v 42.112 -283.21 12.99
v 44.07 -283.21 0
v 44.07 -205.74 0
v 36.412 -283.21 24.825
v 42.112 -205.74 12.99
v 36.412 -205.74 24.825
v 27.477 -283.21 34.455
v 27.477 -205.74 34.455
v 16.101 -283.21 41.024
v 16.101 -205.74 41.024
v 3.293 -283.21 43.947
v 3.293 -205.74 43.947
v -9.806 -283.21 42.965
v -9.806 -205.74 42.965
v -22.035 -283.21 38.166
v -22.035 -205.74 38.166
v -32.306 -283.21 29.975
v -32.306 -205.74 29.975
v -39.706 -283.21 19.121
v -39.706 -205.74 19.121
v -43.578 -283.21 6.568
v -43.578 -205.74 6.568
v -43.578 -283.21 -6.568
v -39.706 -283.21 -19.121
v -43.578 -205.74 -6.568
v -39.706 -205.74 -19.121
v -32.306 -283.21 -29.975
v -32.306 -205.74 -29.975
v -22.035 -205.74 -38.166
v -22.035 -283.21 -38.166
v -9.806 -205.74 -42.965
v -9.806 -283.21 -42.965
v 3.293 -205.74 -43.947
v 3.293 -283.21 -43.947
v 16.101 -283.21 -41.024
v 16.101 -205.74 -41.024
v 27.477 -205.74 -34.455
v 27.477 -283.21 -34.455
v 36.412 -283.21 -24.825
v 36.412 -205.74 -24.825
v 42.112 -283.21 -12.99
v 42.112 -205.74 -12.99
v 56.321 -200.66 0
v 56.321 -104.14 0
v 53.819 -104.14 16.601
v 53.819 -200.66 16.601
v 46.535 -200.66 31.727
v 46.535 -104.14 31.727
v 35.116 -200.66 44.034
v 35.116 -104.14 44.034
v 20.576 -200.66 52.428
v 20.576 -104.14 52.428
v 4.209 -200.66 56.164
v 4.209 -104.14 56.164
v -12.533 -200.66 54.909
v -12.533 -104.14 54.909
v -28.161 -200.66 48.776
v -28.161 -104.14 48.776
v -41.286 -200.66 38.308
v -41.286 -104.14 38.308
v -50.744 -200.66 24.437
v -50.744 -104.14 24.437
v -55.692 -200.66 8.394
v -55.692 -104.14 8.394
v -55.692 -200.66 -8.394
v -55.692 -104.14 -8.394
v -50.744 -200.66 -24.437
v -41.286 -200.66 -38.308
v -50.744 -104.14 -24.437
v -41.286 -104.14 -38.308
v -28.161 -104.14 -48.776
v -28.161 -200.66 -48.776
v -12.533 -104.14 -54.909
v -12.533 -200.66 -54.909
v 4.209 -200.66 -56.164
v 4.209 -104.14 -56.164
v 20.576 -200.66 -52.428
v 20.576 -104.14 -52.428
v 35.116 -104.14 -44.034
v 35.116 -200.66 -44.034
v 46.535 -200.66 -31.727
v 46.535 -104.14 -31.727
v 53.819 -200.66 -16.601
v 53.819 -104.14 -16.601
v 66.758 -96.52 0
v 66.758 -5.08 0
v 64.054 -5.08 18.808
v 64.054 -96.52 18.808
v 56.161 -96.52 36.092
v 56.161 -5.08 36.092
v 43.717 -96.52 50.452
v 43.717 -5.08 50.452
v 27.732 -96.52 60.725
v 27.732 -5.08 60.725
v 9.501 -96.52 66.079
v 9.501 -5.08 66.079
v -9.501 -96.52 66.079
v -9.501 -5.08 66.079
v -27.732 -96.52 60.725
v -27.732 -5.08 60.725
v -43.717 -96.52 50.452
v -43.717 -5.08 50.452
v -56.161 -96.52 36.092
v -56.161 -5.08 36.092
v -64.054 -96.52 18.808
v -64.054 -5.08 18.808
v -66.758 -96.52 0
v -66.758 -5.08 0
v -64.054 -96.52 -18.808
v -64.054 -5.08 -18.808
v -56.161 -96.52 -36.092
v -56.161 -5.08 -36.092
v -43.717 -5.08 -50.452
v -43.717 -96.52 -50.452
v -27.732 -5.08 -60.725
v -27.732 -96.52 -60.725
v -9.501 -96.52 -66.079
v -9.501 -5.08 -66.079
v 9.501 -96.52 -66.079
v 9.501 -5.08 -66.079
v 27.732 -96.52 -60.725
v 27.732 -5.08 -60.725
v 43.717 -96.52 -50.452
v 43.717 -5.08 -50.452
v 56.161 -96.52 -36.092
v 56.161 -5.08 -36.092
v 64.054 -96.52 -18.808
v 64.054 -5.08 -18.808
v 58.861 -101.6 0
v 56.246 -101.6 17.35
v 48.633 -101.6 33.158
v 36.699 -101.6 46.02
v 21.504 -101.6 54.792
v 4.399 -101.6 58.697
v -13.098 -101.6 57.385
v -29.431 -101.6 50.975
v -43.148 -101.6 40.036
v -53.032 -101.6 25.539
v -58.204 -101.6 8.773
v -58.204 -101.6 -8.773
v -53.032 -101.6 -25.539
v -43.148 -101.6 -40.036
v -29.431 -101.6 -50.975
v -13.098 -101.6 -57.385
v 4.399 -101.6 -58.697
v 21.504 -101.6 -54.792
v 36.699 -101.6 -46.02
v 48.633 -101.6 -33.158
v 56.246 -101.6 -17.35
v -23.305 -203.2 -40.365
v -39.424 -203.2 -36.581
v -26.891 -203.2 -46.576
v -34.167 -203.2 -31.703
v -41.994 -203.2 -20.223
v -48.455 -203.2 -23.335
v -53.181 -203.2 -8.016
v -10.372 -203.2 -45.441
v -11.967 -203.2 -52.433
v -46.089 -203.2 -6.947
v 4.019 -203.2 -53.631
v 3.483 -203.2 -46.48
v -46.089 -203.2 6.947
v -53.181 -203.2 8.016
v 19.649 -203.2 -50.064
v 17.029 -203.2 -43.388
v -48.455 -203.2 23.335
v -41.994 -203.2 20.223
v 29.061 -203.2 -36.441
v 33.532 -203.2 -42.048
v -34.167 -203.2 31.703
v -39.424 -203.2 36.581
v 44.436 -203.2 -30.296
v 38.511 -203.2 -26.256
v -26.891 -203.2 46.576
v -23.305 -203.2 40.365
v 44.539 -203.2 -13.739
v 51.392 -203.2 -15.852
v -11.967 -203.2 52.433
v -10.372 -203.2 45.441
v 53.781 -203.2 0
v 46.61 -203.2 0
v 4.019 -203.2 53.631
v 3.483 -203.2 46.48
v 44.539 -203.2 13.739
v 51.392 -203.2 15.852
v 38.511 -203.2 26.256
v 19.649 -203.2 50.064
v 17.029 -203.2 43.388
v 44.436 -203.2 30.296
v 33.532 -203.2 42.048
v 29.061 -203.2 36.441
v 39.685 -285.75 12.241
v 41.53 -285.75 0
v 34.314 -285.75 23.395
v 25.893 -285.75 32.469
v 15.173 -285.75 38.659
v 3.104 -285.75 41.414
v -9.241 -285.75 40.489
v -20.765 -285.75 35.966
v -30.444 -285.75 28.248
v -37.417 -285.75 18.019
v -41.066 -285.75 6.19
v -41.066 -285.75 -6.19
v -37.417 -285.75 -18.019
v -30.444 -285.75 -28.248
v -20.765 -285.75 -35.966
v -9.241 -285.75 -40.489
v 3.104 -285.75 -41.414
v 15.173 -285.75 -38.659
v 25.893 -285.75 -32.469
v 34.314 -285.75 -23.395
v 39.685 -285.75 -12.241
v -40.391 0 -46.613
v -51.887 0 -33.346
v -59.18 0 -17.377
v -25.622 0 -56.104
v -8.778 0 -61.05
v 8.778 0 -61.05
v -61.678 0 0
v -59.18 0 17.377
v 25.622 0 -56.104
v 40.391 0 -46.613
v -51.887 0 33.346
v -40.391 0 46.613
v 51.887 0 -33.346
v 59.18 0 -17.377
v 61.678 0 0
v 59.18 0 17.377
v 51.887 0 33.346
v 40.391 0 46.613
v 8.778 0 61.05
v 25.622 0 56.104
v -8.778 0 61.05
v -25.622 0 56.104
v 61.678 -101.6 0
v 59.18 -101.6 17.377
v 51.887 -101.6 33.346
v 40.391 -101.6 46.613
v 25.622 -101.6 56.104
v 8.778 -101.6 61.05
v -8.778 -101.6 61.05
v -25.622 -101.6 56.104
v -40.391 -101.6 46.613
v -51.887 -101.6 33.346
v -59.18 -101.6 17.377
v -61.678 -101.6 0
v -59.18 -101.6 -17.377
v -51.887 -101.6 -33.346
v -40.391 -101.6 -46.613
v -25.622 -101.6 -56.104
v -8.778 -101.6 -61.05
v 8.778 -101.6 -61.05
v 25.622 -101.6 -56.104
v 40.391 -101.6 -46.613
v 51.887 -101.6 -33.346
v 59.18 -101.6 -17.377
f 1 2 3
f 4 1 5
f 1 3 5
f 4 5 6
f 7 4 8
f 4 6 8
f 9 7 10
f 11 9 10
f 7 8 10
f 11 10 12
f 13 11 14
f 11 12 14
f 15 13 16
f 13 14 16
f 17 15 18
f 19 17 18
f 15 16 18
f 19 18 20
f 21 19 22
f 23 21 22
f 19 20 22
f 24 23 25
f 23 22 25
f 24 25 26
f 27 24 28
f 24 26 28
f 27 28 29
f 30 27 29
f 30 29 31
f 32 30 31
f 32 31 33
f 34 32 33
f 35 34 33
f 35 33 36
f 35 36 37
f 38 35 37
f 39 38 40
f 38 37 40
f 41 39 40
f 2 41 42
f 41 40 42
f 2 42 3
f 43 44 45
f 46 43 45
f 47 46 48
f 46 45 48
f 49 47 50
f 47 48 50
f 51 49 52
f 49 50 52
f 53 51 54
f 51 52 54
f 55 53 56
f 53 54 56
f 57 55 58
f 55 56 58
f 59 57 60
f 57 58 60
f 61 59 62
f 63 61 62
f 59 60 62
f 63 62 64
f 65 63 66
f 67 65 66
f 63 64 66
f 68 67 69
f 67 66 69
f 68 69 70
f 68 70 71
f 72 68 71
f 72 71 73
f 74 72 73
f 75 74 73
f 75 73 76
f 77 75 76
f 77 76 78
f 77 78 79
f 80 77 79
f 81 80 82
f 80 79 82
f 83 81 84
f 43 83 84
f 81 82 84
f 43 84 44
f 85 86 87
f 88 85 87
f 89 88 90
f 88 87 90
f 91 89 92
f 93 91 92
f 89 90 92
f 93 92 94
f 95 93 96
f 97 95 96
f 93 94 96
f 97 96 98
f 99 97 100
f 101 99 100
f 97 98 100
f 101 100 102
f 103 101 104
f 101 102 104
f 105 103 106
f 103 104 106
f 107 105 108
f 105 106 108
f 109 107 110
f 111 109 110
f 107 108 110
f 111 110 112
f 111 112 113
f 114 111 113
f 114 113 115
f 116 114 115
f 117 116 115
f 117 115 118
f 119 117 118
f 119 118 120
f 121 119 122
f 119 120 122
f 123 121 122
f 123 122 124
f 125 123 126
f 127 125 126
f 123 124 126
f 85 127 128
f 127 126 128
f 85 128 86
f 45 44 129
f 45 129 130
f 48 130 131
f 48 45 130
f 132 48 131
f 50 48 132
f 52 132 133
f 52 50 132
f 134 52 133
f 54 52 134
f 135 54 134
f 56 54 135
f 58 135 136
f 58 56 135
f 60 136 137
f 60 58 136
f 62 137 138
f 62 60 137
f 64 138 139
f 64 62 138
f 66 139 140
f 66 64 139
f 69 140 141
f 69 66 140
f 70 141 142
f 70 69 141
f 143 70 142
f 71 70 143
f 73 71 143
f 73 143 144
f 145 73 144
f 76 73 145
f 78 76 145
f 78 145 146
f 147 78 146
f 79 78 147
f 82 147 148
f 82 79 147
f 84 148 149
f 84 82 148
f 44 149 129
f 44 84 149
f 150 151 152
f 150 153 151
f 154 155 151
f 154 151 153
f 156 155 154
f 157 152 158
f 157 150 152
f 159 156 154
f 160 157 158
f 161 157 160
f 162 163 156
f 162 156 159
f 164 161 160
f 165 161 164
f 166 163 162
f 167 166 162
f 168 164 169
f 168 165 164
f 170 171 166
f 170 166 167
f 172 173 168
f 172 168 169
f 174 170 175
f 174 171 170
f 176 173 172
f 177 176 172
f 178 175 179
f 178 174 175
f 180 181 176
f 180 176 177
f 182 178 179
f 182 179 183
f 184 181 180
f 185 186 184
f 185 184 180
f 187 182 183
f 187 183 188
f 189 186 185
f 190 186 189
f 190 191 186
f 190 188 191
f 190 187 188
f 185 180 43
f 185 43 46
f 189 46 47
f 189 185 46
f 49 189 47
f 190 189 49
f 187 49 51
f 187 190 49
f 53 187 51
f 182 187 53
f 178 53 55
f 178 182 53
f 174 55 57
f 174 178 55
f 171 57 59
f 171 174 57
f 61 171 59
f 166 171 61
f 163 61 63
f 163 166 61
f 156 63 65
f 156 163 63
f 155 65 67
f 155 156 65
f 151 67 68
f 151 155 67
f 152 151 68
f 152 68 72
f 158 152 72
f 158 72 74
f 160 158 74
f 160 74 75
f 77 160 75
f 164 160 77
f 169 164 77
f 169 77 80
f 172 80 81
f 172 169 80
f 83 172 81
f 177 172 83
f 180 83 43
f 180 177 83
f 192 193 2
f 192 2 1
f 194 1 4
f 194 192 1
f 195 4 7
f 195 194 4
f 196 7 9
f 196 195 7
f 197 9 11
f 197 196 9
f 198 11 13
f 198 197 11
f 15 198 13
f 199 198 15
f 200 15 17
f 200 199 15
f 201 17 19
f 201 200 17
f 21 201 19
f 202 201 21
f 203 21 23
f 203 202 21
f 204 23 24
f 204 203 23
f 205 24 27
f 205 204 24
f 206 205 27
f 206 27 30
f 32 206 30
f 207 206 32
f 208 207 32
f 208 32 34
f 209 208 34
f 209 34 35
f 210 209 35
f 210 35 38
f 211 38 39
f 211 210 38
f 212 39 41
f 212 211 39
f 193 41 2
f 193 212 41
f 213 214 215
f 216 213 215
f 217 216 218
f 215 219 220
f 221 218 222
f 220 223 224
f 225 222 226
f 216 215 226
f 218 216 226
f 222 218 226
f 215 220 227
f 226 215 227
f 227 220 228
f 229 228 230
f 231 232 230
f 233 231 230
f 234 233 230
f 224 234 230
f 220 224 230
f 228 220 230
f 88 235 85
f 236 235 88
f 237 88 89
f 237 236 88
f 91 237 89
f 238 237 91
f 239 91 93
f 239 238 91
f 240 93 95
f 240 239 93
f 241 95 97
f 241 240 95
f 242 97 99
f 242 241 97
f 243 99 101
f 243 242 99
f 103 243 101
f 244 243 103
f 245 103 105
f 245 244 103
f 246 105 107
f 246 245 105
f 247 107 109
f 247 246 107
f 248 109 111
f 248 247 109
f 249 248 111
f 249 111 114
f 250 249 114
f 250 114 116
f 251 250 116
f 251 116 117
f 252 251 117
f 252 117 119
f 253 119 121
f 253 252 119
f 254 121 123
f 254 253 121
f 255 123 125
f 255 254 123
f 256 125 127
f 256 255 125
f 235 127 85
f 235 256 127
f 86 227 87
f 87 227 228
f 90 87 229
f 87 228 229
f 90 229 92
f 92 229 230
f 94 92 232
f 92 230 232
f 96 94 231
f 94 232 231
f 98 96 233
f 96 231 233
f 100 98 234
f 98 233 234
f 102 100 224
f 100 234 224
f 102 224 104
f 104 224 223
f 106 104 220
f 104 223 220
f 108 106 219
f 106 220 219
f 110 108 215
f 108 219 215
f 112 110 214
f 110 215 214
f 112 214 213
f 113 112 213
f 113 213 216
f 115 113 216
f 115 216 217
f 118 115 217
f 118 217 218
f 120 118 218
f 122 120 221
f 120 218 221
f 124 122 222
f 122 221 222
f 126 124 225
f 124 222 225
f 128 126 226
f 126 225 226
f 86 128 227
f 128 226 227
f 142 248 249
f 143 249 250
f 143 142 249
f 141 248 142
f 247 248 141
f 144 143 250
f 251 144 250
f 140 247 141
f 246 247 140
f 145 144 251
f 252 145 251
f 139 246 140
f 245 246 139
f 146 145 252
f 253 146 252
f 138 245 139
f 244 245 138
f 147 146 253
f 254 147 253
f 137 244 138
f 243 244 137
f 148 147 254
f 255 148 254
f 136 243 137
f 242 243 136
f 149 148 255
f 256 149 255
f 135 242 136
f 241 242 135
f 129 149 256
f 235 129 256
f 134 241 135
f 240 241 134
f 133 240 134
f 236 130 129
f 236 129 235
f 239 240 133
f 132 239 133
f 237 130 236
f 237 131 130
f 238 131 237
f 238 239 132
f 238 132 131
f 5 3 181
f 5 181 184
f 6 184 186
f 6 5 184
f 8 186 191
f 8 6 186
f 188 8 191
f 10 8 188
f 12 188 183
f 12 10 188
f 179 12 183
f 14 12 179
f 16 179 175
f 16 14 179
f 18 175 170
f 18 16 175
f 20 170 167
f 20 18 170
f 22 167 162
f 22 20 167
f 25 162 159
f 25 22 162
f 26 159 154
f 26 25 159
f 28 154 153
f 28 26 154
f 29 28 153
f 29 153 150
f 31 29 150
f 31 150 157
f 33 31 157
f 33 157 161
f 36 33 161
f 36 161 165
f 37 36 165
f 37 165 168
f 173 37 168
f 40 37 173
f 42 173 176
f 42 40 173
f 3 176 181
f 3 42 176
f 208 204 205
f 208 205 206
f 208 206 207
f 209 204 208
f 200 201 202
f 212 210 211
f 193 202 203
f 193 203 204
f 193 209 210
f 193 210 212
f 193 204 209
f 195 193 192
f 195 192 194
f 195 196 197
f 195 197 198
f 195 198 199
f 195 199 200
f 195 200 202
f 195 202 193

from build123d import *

# Parameters (mm, degrees)
F0_R     = 66.758219
F1_DEPTH = 101.6
F2_R     = 56.321266
F3_DEPTH = 101.6
F4_R     = 44.069911
F5_DEPTH = 82.55
F6_SIZE  = 5.08
F7_SIZE  = 2.54


with BuildPart() as f1:
    # F0 (on Front) → F1 (new body)
    with BuildSketch(Plane.XZ):
        Circle(F0_R)
    extrude(amount=F1_DEPTH)

    # F2 (on face) → F3 (join)
    with BuildSketch(Plane.XZ.offset(101.6)):
        Circle(F2_R)
    extrude(amount=F3_DEPTH)

    # F4 (on face) → F5 (join)
    with BuildSketch(Plane.XZ.offset(203.2)):
        Circle(F4_R)
    extrude(amount=F5_DEPTH)

    # F6
    f6_edges = [f1.edges().sort_by_distance(p)[0] for p in [
        (66.758219, -50.8, 0),
        (-66.758219, 0, 0),
        (-66.758219, -101.6, 0),
    ]]
    chamfer(f6_edges, length=F6_SIZE)

    # F7
    f7_edges = [f1.edges().sort_by_distance(p)[0] for p in [
        (56.321266, -152.4, 0),
        (-56.321266, -101.6, 0),
        (-56.321266, -203.2, 0),
        (44.069911, -244.475, 0),
        (-44.069911, -203.2, 0),
        (-44.069911, -285.75, 0),
    ]]
    chamfer(f7_edges, length=F7_SIZE)


solid = f1.part
